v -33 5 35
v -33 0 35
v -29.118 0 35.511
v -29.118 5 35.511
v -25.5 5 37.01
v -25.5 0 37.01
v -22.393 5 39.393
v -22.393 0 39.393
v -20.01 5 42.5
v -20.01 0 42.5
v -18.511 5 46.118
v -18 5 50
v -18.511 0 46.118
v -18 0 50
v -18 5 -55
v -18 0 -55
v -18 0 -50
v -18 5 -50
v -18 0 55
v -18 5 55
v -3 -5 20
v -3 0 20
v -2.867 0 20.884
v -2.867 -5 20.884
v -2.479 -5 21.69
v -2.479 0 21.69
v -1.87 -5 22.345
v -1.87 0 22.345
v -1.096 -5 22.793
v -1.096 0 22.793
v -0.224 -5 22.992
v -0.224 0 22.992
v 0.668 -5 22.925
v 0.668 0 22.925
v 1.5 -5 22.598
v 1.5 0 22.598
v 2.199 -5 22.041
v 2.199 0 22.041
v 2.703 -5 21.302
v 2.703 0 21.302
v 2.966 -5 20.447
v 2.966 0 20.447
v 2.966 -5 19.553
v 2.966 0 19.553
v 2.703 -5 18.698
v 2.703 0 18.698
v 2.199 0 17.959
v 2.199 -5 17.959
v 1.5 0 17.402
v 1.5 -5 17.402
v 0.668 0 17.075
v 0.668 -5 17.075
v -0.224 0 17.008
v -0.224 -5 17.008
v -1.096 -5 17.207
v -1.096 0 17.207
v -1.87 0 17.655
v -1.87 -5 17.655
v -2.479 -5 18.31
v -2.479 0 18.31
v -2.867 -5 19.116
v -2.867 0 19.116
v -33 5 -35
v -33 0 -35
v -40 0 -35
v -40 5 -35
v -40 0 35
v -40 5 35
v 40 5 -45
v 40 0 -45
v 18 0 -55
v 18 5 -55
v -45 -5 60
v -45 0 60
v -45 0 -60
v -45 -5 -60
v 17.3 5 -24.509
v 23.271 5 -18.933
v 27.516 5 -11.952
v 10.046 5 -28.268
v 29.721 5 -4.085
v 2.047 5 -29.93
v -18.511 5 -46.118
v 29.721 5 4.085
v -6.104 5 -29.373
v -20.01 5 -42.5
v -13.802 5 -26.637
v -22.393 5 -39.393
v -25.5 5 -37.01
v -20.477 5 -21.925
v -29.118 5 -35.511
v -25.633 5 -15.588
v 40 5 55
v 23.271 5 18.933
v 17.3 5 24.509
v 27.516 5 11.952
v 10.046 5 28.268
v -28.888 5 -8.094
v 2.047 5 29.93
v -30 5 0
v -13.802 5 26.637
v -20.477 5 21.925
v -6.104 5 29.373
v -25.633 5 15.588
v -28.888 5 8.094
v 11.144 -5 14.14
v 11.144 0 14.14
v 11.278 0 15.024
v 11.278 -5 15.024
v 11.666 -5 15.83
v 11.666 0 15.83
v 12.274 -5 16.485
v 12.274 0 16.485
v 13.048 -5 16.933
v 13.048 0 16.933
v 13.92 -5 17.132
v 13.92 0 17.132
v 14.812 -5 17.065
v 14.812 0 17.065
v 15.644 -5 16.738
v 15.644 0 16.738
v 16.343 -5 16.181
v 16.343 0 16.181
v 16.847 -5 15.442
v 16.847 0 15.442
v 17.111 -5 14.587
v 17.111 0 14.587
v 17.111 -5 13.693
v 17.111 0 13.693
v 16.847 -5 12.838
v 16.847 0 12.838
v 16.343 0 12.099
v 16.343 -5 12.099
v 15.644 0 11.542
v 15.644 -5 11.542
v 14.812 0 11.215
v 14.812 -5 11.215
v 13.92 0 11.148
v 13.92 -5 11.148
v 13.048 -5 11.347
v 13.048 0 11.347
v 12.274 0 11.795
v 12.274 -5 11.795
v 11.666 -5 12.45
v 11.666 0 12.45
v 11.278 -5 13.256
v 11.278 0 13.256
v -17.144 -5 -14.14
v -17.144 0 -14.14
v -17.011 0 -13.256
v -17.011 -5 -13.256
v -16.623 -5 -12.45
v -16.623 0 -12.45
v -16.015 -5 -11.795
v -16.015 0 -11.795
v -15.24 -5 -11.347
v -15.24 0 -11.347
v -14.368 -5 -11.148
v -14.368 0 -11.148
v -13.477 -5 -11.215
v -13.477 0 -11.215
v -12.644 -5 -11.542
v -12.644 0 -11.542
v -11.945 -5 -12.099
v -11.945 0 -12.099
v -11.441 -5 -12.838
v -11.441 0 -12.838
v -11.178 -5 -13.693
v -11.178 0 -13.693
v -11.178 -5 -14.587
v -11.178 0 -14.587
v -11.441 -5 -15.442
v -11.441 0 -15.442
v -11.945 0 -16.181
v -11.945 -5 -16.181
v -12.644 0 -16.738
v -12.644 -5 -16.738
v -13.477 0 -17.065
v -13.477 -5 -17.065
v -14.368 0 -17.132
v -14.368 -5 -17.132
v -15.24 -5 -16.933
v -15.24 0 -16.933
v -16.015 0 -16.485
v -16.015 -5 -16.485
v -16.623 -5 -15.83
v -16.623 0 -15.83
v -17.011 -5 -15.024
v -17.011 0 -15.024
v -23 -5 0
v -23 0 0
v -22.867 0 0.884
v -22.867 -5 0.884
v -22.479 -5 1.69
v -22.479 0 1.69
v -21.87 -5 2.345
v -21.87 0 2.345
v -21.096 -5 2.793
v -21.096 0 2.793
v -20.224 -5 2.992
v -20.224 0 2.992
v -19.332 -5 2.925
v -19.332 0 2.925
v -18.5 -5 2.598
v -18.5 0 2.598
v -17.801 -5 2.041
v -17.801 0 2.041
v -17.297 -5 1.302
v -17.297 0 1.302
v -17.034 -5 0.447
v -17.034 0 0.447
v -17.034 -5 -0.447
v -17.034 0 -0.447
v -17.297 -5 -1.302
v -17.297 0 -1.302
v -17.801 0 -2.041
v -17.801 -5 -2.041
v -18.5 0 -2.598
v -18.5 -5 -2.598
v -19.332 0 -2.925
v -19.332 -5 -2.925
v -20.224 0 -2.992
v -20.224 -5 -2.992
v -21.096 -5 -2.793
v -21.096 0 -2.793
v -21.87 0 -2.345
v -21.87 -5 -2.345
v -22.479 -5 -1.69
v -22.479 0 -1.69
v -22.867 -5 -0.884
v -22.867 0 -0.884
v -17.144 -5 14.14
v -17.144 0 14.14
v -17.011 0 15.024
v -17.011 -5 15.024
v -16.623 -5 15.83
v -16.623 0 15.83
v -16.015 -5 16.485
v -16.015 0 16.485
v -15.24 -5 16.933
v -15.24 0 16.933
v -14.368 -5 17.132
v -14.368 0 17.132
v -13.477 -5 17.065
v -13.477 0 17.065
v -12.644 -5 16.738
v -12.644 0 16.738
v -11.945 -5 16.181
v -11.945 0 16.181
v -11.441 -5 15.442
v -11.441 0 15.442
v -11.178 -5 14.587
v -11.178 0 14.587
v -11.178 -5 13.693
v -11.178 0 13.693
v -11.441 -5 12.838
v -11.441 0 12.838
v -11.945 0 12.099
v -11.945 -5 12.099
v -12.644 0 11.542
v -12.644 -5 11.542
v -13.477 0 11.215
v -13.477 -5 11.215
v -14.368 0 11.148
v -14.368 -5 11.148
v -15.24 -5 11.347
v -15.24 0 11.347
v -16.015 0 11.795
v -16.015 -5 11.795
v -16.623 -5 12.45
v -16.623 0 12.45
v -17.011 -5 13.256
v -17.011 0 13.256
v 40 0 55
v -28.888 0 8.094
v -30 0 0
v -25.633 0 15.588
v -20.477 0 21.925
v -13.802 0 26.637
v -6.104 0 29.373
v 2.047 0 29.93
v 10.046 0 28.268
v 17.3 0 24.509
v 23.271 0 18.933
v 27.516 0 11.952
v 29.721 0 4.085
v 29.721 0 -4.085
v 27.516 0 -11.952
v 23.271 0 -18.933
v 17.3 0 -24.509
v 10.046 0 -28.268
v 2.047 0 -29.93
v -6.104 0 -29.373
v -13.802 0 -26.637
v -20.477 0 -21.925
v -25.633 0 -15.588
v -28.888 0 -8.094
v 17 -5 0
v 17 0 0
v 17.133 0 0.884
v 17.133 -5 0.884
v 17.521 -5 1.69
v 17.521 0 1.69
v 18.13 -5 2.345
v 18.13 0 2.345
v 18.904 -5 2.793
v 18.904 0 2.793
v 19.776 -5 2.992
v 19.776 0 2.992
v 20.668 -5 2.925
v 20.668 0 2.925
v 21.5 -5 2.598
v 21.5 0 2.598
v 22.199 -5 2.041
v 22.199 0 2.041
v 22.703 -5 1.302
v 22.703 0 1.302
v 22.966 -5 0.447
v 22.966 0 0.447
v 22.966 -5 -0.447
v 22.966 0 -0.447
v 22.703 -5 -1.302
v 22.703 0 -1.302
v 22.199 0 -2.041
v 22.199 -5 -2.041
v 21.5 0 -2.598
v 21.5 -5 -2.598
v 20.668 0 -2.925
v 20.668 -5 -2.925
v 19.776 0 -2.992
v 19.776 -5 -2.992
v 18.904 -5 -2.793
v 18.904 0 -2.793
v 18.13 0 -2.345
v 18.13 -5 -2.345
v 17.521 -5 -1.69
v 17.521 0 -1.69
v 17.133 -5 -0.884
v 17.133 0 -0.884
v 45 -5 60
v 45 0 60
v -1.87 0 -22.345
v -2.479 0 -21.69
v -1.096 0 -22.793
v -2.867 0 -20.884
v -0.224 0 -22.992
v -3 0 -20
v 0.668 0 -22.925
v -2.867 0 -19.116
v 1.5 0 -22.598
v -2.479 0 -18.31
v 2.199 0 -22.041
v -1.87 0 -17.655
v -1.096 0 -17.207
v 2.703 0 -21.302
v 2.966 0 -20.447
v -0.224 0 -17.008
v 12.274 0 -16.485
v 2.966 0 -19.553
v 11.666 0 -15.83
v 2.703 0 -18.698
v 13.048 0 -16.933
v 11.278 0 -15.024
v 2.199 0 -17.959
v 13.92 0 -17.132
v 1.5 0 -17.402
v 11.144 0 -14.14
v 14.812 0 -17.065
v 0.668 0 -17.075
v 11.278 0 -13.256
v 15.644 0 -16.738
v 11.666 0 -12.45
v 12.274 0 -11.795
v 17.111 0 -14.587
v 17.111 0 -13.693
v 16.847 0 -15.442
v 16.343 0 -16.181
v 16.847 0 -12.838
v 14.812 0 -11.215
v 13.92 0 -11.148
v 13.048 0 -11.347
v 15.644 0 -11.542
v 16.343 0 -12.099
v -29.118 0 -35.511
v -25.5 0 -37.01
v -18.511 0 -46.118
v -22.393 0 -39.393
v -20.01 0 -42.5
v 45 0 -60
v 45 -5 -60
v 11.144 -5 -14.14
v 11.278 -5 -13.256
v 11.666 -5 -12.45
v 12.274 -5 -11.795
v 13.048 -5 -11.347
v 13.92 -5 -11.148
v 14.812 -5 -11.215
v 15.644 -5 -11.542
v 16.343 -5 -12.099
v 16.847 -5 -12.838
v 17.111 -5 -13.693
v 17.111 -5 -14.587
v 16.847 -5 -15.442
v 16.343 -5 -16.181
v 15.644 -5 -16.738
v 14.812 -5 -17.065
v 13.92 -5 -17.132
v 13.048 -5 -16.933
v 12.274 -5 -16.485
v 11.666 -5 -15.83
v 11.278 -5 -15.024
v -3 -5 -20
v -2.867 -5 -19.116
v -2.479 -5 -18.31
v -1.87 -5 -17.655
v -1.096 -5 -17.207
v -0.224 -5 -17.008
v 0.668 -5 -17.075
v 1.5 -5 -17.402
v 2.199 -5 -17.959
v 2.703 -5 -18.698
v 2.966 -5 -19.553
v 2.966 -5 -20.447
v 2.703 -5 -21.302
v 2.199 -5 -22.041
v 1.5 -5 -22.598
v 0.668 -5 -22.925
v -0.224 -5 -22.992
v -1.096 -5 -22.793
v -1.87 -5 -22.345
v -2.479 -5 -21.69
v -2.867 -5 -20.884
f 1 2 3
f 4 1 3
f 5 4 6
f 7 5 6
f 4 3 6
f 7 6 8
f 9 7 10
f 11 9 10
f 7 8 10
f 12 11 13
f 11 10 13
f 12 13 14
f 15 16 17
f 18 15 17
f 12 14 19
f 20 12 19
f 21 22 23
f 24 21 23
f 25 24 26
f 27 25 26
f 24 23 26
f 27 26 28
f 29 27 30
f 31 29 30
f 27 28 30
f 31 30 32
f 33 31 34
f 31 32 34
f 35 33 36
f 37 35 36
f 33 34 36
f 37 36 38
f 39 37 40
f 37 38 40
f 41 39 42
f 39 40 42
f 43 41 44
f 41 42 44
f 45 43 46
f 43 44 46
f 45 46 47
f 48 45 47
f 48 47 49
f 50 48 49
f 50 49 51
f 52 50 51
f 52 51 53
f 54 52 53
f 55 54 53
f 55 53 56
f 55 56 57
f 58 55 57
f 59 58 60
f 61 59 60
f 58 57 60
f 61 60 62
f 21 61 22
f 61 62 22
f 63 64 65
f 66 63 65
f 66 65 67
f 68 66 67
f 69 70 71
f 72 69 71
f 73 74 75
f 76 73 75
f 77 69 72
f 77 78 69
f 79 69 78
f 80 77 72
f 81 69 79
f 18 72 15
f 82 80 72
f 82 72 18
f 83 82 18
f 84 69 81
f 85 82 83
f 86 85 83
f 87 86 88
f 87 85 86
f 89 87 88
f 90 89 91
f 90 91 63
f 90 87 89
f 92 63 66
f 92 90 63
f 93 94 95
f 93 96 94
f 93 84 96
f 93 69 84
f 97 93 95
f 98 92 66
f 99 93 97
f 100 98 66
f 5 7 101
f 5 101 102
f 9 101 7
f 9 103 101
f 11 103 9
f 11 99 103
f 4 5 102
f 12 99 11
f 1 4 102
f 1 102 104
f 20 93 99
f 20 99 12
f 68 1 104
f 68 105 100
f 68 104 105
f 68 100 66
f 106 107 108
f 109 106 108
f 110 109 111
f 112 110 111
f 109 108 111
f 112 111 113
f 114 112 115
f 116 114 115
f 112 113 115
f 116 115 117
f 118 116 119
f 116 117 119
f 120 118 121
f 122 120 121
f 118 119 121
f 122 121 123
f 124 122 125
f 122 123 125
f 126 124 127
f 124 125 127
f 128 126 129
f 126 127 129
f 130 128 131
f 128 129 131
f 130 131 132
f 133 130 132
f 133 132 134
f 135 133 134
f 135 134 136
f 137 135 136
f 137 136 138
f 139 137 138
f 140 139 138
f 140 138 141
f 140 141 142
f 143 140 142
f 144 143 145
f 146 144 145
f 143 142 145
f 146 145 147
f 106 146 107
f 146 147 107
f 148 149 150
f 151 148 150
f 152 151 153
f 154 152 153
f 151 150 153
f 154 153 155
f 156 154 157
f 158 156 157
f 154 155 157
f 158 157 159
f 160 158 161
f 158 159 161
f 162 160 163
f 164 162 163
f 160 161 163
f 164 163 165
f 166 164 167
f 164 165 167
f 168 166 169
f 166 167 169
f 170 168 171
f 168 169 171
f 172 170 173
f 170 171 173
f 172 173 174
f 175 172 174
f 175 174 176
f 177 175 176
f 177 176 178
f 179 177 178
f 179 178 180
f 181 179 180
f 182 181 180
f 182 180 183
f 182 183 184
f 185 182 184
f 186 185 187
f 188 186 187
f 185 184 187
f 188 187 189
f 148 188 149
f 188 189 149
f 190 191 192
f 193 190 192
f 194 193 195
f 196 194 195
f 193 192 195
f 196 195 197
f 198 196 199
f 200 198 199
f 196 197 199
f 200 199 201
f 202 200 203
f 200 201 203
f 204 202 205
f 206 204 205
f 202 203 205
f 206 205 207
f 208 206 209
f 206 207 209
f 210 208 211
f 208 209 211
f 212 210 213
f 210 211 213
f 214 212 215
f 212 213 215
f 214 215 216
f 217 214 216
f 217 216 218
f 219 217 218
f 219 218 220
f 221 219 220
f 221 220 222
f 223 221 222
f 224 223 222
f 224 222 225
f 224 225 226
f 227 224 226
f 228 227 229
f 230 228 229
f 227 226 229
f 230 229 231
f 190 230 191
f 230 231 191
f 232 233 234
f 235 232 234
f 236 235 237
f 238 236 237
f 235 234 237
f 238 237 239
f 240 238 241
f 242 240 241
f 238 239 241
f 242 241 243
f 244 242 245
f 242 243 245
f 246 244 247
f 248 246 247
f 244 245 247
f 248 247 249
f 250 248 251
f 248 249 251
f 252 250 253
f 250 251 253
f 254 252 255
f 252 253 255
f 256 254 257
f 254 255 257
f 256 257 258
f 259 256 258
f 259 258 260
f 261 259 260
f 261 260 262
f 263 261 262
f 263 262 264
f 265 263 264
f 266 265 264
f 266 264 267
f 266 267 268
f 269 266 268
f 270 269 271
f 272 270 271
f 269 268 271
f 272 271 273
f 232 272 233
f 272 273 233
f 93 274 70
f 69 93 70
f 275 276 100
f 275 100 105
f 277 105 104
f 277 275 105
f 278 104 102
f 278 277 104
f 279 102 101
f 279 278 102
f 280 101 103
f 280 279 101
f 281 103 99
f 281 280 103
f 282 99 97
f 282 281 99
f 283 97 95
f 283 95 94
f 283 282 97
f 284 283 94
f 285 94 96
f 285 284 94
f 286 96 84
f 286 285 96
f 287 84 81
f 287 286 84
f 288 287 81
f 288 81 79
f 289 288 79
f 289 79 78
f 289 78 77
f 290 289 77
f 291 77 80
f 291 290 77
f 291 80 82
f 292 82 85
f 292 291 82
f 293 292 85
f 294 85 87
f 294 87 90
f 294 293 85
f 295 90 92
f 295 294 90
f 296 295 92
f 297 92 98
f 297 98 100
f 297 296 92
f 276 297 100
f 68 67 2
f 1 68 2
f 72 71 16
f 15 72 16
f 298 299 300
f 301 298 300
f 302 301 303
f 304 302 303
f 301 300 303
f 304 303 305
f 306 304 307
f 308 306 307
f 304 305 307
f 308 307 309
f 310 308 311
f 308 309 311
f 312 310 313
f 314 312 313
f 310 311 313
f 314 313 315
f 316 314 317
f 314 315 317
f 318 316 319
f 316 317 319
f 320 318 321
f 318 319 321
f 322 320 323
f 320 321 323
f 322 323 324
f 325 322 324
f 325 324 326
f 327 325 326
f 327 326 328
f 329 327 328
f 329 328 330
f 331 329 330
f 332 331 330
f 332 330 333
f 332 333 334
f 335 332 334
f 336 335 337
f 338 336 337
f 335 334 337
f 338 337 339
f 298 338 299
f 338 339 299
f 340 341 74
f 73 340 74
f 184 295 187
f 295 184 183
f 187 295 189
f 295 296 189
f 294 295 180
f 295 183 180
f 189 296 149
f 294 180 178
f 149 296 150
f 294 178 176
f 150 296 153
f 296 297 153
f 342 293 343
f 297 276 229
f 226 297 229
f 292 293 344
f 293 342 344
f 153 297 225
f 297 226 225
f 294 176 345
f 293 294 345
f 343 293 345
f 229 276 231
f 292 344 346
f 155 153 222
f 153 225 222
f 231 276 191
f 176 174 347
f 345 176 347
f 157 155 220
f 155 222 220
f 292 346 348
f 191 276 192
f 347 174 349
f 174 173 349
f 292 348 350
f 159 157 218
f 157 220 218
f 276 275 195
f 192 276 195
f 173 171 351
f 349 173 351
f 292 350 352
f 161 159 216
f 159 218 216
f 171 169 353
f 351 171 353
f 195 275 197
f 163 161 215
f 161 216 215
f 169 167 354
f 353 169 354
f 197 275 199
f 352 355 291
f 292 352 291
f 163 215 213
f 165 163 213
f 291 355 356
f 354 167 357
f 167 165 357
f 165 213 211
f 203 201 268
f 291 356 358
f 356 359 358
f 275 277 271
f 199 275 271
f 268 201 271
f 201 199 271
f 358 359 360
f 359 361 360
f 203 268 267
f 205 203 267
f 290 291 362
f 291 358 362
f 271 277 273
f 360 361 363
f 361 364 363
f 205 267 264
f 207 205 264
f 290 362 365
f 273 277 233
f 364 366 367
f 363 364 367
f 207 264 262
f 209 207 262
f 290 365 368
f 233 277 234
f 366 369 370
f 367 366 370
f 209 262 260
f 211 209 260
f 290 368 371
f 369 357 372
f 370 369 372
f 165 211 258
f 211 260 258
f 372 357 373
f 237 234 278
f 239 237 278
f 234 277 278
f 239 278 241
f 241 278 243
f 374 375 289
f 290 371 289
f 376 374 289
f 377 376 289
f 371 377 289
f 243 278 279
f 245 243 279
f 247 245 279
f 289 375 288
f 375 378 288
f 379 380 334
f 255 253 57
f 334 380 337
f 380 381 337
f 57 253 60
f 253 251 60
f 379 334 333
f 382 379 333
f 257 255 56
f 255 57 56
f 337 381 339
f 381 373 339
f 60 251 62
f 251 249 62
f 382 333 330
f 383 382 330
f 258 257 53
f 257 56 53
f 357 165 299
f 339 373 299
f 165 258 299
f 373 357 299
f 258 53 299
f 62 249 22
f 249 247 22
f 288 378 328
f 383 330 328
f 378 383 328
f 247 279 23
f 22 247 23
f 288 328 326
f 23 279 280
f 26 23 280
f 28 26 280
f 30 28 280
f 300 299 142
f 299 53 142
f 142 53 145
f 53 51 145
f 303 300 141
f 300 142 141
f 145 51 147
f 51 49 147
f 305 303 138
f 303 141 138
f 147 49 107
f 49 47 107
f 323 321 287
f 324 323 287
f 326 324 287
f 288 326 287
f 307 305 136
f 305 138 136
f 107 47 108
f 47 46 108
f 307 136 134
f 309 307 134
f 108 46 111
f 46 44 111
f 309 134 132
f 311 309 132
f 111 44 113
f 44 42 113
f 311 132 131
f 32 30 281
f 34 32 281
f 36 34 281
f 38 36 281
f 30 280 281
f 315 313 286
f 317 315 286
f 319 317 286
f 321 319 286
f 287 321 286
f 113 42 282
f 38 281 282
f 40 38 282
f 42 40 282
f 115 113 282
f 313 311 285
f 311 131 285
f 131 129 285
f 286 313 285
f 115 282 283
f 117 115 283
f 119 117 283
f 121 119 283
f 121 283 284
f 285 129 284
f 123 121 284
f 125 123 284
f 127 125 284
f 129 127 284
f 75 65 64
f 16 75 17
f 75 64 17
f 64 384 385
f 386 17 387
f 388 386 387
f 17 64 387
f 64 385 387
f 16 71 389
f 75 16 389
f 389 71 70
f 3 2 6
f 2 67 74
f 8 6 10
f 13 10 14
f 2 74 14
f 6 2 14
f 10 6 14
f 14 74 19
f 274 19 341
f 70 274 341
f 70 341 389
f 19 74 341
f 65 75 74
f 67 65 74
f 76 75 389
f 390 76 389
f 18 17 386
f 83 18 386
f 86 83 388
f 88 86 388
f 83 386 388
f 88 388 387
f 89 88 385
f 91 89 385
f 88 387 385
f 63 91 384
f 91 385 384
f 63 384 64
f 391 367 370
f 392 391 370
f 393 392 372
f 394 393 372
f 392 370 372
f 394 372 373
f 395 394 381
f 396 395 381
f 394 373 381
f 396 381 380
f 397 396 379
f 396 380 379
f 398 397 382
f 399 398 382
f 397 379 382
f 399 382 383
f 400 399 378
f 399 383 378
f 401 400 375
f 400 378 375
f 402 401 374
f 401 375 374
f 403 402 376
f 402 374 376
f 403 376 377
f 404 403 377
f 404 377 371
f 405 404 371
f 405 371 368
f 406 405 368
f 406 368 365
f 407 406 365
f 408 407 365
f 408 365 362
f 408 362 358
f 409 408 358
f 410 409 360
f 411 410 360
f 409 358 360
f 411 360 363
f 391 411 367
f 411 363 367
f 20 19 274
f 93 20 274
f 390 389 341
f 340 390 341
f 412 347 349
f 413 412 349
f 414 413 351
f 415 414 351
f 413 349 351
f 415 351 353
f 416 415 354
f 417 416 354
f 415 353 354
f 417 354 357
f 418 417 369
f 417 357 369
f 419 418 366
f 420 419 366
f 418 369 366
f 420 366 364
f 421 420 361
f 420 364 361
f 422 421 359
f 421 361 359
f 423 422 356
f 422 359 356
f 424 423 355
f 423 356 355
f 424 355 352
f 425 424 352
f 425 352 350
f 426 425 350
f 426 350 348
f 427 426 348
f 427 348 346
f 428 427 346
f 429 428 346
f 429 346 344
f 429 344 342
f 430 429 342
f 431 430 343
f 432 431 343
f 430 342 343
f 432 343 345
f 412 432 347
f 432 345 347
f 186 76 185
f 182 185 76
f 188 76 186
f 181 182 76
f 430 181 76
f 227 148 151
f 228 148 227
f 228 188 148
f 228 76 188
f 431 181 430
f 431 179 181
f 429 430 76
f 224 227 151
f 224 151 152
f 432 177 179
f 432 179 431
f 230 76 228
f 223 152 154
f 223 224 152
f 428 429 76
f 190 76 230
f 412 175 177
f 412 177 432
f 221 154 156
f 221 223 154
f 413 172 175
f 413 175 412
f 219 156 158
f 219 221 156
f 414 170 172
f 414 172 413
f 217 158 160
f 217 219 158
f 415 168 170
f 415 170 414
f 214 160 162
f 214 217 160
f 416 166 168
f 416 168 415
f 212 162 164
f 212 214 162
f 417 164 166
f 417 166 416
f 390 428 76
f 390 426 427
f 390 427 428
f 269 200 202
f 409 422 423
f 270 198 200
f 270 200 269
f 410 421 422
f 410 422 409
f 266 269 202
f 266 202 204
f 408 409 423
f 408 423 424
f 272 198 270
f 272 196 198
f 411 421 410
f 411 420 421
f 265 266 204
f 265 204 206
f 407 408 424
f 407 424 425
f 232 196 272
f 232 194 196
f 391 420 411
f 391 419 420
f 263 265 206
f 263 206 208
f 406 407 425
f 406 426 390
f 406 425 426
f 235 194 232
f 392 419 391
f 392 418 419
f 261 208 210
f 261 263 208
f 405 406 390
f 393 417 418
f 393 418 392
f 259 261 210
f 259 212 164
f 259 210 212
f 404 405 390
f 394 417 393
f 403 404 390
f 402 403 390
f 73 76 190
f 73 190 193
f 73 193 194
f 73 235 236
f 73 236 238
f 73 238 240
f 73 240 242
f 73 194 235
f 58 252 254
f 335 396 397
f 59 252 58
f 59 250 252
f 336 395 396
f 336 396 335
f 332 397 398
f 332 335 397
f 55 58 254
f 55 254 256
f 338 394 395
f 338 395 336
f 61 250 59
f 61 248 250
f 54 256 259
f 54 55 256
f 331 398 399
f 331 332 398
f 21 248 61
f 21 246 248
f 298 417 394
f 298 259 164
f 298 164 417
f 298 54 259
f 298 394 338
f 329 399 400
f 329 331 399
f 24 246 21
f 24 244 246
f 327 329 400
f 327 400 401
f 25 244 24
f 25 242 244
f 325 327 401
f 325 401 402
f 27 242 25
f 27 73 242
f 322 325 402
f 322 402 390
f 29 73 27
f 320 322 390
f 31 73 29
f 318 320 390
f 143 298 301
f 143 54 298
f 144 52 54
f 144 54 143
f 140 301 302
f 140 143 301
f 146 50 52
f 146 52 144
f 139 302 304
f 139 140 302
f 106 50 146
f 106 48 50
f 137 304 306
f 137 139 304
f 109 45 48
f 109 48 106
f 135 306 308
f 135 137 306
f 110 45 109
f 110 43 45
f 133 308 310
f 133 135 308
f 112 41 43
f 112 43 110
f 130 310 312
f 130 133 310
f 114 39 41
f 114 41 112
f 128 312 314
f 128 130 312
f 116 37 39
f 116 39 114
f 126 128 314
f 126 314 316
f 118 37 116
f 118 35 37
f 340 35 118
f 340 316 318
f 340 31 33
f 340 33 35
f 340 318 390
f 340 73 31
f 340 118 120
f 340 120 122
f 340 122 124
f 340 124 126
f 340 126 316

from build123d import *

# Parameters (mm, degrees)
F1_DEPTH = 5
F2_R     = 30
F3_DEPTH = 5
F4_R     = 3
F5_DEPTH = 5


with BuildPart() as f1:
    # F0 (on Front) → F1 (new body)
    with BuildSketch(Plane.XZ):
        Polygon((45, -60), (45, 0), (45, 60), (0, 60), (-45, 60), (-45, 0), (-45, -60), (0, -60), align=None)
    extrude(amount=F1_DEPTH)

    # F2 (on face) → F3 (join)
    with BuildSketch(Plane(origin=(0, 0, 0), x_dir=(-1, 0, 0), z_dir=(0, 1, 0))):
        with BuildLine():
            Line((-40, 55), (-40, -45))
            Line((-40, -45), (-18, -55))
            Line((-18, -55), (18, -55))
            Line((18, -55), (18, -50))
            ThreePointArc((18, -50), (22.393398, -39.393398), (33, -35))
            Line((33, -35), (40, -35))
            Line((40, -35), (40, 35))
            Line((40, 35), (33, 35))
            ThreePointArc((33, 35), (22.393398, 39.393398), (18, 50))
            Line((18, 50), (18, 55))
            Line((18, 55), (-40, 55))
        make_face()
        Circle(F2_R, mode=Mode.SUBTRACT)
    extrude(amount=F3_DEPTH)

    # F4 (on face) → F5 (cut)
    with BuildSketch(Plane(origin=(0, 0, 0), x_dir=(-1, 0, 0), z_dir=(0, 1, 0))):
        with Locations((-14.144271, -14.14)):
            Circle(F4_R)
        with Locations((-20, 0)):
            Circle(F4_R)
        with Locations((-14.144271, 14.14)):
            Circle(F4_R)
        with Locations((0, 20)):
            Circle(F4_R)
        with Locations((14.144271, 14.14)):
            Circle(F4_R)
        with Locations((20, 0)):
            Circle(F4_R)
        with Locations((14.144271, -14.14)):
            Circle(F4_R)
        with Locations((0, -20)):
            Circle(F4_R)
    extrude(amount=-F5_DEPTH, mode=Mode.SUBTRACT)


solid = f1.part
